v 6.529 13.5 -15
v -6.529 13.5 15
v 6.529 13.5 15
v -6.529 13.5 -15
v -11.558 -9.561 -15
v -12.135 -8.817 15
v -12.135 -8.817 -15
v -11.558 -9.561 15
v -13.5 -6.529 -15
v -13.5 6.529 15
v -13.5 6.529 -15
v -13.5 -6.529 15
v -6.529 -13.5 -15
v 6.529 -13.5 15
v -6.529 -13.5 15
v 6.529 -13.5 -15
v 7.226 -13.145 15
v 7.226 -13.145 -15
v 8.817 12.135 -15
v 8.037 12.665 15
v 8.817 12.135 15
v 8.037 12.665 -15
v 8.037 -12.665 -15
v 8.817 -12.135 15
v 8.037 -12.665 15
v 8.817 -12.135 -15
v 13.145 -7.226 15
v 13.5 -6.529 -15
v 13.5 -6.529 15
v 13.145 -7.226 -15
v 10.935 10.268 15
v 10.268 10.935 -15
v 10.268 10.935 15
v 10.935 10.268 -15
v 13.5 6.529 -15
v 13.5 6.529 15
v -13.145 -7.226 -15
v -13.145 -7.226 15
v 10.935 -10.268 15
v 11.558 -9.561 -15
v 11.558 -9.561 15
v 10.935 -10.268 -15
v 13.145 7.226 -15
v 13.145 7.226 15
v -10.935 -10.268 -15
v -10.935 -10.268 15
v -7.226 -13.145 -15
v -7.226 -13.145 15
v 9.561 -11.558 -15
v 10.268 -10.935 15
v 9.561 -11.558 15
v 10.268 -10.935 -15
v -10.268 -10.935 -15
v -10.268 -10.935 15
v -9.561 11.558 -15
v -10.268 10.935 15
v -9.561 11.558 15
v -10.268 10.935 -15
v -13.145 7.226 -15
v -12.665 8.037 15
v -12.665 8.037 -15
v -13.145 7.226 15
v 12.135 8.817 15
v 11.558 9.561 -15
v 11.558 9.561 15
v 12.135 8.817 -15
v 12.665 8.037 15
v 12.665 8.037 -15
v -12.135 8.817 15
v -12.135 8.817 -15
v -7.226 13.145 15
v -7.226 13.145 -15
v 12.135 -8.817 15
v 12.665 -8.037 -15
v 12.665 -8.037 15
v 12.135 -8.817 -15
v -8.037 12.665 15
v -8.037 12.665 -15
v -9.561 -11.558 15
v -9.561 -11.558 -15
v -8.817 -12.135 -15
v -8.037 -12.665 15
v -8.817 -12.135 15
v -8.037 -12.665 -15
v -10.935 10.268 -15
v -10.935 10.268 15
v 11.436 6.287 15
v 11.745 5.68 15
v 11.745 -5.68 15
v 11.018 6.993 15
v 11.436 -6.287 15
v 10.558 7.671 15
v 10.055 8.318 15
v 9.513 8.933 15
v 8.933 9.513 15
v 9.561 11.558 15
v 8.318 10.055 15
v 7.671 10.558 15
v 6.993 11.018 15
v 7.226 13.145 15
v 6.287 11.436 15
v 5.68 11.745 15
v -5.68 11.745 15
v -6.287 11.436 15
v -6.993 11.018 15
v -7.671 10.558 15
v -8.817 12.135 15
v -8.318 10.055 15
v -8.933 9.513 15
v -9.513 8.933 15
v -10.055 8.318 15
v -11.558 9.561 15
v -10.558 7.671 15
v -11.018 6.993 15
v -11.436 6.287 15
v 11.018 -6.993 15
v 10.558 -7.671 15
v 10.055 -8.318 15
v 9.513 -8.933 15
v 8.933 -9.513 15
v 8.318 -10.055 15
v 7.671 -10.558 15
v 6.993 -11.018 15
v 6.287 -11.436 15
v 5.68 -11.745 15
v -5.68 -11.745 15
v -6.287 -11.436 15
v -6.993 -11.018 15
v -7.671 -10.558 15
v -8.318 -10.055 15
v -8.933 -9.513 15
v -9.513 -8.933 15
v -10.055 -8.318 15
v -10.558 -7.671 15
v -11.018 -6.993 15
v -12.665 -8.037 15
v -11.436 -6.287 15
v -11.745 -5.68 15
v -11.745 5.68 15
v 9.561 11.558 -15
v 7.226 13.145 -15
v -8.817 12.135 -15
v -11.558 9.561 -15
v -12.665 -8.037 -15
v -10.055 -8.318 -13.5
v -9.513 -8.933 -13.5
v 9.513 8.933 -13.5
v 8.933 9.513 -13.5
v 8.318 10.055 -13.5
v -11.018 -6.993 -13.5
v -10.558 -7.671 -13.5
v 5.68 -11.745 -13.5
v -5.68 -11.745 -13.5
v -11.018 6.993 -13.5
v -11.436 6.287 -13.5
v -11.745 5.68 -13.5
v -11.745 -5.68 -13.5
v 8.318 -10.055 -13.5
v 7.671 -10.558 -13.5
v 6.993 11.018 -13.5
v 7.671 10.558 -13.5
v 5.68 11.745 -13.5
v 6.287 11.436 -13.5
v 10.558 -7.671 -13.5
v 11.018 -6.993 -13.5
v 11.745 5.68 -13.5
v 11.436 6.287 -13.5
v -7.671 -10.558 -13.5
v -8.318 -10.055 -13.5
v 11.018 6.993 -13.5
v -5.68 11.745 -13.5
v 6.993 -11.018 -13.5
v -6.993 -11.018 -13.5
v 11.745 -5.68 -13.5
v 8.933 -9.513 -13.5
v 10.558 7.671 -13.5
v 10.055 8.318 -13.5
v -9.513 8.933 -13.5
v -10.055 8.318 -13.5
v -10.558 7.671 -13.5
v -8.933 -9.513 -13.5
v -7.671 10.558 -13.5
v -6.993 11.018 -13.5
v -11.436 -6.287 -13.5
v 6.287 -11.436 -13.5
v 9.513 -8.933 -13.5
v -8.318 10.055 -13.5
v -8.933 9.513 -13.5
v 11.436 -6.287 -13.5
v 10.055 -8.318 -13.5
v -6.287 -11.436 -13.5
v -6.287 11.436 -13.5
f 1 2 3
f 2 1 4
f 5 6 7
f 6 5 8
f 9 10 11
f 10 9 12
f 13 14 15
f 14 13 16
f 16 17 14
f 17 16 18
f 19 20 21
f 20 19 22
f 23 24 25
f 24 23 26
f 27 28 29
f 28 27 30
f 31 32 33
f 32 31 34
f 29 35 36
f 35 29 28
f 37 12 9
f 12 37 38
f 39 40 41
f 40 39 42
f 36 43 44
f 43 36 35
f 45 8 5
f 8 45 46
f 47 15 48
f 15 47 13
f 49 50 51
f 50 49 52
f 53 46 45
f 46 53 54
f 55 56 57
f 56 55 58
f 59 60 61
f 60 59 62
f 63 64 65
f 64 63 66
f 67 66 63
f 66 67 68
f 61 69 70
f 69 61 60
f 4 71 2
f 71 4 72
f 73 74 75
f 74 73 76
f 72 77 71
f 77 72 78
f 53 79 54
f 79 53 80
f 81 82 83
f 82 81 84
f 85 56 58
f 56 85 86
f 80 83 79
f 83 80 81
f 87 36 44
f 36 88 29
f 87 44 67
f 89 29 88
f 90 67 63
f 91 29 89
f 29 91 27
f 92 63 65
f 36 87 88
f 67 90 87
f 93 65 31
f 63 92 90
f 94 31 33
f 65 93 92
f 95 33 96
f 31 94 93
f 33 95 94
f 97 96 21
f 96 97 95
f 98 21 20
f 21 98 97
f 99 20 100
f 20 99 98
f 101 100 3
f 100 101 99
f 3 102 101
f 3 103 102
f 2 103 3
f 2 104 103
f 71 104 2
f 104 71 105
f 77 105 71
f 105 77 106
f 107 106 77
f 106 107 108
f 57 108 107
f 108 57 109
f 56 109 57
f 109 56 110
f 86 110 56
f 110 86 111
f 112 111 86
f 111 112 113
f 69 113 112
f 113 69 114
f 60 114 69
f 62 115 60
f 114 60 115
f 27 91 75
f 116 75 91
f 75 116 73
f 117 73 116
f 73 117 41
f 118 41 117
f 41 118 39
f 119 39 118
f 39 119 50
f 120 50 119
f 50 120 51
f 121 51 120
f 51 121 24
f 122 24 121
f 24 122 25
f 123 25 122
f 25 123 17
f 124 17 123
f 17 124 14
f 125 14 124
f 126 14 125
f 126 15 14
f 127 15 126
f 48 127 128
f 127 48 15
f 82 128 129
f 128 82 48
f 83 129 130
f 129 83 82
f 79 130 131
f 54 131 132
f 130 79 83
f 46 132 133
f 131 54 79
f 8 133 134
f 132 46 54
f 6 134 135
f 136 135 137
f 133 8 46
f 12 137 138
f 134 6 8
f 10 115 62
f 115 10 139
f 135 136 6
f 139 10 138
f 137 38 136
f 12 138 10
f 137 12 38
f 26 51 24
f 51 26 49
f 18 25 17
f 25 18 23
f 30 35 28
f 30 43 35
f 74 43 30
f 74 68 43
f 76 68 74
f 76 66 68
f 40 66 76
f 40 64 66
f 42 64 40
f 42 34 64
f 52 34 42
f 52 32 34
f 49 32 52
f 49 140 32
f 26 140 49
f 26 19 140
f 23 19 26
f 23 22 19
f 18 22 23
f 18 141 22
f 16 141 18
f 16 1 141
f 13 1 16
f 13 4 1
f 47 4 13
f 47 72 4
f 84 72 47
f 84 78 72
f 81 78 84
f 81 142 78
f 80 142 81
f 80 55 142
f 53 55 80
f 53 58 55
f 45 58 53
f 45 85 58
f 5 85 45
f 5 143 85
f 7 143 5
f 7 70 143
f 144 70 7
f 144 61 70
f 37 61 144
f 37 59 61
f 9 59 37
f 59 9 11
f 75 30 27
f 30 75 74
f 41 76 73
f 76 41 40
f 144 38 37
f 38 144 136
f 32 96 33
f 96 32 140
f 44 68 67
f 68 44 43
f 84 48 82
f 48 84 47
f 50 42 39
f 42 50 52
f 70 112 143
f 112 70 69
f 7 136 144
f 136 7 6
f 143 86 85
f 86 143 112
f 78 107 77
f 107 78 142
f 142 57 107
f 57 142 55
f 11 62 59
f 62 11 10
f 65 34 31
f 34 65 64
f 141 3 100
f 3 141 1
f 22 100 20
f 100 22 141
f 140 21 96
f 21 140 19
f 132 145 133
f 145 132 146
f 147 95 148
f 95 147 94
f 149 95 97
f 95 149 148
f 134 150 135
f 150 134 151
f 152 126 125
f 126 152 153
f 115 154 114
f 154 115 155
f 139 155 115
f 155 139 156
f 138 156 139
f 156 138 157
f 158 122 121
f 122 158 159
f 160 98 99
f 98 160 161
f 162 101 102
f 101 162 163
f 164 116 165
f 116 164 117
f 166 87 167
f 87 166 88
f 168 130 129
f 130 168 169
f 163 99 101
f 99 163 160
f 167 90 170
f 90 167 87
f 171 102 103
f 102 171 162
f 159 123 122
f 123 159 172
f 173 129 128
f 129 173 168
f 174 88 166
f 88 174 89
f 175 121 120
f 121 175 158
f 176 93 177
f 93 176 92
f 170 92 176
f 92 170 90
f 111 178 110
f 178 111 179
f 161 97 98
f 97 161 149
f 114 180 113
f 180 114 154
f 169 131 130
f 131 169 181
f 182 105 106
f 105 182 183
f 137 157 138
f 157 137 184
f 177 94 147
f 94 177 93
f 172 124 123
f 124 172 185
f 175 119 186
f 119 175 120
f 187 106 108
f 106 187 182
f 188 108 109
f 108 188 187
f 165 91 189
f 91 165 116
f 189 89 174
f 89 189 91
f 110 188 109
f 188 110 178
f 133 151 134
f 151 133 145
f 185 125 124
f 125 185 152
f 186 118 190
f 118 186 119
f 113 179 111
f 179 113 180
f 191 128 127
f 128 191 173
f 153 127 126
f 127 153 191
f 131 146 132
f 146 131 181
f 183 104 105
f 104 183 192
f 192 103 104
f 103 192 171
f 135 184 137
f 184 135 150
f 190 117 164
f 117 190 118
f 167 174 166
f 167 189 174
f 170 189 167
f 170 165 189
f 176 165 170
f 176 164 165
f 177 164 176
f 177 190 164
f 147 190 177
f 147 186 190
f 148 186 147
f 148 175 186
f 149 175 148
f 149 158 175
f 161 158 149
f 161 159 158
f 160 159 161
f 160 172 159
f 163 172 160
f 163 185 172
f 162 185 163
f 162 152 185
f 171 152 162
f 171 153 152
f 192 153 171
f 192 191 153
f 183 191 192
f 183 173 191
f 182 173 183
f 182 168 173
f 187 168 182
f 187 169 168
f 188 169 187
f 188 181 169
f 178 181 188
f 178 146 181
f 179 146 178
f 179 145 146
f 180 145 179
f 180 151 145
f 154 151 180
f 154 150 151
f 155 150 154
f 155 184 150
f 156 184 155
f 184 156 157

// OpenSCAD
// Juergen Steupert

// variables 
// height for cup holder
h = 30;

// base width
w = h*.5;
w2 = w*.87;

$fn = 100;

module outside(){
    hull(){
        intersection(){
            cube([1.8*w, 1.8*w, h], center = true);
            cylinder(h = h,r=w, center = true);
        }
    }
}



module inside(){
    hull(){
        intersection(){
            cube([1.8*w2, 1.8*w2, h*1.1], center = true);
            cylinder(h = h*1.1,r=w2, center = true);
        }
    }
}

module base(){
    translate([0,0,-(h/2)+(0.025*h)]){
        hull(){
            intersection(){
                cube([1.8*w2, 1.8*w2, h*0.05], center = true);
                cylinder(h = h*0.05,r=w2, center = true);
            }
        }
    }
}
base();

module cup(){
    difference(){
        outside();
        inside();
    }
}

module shell(){
    union(){
        cup();
        base();
    }
}
shell();
